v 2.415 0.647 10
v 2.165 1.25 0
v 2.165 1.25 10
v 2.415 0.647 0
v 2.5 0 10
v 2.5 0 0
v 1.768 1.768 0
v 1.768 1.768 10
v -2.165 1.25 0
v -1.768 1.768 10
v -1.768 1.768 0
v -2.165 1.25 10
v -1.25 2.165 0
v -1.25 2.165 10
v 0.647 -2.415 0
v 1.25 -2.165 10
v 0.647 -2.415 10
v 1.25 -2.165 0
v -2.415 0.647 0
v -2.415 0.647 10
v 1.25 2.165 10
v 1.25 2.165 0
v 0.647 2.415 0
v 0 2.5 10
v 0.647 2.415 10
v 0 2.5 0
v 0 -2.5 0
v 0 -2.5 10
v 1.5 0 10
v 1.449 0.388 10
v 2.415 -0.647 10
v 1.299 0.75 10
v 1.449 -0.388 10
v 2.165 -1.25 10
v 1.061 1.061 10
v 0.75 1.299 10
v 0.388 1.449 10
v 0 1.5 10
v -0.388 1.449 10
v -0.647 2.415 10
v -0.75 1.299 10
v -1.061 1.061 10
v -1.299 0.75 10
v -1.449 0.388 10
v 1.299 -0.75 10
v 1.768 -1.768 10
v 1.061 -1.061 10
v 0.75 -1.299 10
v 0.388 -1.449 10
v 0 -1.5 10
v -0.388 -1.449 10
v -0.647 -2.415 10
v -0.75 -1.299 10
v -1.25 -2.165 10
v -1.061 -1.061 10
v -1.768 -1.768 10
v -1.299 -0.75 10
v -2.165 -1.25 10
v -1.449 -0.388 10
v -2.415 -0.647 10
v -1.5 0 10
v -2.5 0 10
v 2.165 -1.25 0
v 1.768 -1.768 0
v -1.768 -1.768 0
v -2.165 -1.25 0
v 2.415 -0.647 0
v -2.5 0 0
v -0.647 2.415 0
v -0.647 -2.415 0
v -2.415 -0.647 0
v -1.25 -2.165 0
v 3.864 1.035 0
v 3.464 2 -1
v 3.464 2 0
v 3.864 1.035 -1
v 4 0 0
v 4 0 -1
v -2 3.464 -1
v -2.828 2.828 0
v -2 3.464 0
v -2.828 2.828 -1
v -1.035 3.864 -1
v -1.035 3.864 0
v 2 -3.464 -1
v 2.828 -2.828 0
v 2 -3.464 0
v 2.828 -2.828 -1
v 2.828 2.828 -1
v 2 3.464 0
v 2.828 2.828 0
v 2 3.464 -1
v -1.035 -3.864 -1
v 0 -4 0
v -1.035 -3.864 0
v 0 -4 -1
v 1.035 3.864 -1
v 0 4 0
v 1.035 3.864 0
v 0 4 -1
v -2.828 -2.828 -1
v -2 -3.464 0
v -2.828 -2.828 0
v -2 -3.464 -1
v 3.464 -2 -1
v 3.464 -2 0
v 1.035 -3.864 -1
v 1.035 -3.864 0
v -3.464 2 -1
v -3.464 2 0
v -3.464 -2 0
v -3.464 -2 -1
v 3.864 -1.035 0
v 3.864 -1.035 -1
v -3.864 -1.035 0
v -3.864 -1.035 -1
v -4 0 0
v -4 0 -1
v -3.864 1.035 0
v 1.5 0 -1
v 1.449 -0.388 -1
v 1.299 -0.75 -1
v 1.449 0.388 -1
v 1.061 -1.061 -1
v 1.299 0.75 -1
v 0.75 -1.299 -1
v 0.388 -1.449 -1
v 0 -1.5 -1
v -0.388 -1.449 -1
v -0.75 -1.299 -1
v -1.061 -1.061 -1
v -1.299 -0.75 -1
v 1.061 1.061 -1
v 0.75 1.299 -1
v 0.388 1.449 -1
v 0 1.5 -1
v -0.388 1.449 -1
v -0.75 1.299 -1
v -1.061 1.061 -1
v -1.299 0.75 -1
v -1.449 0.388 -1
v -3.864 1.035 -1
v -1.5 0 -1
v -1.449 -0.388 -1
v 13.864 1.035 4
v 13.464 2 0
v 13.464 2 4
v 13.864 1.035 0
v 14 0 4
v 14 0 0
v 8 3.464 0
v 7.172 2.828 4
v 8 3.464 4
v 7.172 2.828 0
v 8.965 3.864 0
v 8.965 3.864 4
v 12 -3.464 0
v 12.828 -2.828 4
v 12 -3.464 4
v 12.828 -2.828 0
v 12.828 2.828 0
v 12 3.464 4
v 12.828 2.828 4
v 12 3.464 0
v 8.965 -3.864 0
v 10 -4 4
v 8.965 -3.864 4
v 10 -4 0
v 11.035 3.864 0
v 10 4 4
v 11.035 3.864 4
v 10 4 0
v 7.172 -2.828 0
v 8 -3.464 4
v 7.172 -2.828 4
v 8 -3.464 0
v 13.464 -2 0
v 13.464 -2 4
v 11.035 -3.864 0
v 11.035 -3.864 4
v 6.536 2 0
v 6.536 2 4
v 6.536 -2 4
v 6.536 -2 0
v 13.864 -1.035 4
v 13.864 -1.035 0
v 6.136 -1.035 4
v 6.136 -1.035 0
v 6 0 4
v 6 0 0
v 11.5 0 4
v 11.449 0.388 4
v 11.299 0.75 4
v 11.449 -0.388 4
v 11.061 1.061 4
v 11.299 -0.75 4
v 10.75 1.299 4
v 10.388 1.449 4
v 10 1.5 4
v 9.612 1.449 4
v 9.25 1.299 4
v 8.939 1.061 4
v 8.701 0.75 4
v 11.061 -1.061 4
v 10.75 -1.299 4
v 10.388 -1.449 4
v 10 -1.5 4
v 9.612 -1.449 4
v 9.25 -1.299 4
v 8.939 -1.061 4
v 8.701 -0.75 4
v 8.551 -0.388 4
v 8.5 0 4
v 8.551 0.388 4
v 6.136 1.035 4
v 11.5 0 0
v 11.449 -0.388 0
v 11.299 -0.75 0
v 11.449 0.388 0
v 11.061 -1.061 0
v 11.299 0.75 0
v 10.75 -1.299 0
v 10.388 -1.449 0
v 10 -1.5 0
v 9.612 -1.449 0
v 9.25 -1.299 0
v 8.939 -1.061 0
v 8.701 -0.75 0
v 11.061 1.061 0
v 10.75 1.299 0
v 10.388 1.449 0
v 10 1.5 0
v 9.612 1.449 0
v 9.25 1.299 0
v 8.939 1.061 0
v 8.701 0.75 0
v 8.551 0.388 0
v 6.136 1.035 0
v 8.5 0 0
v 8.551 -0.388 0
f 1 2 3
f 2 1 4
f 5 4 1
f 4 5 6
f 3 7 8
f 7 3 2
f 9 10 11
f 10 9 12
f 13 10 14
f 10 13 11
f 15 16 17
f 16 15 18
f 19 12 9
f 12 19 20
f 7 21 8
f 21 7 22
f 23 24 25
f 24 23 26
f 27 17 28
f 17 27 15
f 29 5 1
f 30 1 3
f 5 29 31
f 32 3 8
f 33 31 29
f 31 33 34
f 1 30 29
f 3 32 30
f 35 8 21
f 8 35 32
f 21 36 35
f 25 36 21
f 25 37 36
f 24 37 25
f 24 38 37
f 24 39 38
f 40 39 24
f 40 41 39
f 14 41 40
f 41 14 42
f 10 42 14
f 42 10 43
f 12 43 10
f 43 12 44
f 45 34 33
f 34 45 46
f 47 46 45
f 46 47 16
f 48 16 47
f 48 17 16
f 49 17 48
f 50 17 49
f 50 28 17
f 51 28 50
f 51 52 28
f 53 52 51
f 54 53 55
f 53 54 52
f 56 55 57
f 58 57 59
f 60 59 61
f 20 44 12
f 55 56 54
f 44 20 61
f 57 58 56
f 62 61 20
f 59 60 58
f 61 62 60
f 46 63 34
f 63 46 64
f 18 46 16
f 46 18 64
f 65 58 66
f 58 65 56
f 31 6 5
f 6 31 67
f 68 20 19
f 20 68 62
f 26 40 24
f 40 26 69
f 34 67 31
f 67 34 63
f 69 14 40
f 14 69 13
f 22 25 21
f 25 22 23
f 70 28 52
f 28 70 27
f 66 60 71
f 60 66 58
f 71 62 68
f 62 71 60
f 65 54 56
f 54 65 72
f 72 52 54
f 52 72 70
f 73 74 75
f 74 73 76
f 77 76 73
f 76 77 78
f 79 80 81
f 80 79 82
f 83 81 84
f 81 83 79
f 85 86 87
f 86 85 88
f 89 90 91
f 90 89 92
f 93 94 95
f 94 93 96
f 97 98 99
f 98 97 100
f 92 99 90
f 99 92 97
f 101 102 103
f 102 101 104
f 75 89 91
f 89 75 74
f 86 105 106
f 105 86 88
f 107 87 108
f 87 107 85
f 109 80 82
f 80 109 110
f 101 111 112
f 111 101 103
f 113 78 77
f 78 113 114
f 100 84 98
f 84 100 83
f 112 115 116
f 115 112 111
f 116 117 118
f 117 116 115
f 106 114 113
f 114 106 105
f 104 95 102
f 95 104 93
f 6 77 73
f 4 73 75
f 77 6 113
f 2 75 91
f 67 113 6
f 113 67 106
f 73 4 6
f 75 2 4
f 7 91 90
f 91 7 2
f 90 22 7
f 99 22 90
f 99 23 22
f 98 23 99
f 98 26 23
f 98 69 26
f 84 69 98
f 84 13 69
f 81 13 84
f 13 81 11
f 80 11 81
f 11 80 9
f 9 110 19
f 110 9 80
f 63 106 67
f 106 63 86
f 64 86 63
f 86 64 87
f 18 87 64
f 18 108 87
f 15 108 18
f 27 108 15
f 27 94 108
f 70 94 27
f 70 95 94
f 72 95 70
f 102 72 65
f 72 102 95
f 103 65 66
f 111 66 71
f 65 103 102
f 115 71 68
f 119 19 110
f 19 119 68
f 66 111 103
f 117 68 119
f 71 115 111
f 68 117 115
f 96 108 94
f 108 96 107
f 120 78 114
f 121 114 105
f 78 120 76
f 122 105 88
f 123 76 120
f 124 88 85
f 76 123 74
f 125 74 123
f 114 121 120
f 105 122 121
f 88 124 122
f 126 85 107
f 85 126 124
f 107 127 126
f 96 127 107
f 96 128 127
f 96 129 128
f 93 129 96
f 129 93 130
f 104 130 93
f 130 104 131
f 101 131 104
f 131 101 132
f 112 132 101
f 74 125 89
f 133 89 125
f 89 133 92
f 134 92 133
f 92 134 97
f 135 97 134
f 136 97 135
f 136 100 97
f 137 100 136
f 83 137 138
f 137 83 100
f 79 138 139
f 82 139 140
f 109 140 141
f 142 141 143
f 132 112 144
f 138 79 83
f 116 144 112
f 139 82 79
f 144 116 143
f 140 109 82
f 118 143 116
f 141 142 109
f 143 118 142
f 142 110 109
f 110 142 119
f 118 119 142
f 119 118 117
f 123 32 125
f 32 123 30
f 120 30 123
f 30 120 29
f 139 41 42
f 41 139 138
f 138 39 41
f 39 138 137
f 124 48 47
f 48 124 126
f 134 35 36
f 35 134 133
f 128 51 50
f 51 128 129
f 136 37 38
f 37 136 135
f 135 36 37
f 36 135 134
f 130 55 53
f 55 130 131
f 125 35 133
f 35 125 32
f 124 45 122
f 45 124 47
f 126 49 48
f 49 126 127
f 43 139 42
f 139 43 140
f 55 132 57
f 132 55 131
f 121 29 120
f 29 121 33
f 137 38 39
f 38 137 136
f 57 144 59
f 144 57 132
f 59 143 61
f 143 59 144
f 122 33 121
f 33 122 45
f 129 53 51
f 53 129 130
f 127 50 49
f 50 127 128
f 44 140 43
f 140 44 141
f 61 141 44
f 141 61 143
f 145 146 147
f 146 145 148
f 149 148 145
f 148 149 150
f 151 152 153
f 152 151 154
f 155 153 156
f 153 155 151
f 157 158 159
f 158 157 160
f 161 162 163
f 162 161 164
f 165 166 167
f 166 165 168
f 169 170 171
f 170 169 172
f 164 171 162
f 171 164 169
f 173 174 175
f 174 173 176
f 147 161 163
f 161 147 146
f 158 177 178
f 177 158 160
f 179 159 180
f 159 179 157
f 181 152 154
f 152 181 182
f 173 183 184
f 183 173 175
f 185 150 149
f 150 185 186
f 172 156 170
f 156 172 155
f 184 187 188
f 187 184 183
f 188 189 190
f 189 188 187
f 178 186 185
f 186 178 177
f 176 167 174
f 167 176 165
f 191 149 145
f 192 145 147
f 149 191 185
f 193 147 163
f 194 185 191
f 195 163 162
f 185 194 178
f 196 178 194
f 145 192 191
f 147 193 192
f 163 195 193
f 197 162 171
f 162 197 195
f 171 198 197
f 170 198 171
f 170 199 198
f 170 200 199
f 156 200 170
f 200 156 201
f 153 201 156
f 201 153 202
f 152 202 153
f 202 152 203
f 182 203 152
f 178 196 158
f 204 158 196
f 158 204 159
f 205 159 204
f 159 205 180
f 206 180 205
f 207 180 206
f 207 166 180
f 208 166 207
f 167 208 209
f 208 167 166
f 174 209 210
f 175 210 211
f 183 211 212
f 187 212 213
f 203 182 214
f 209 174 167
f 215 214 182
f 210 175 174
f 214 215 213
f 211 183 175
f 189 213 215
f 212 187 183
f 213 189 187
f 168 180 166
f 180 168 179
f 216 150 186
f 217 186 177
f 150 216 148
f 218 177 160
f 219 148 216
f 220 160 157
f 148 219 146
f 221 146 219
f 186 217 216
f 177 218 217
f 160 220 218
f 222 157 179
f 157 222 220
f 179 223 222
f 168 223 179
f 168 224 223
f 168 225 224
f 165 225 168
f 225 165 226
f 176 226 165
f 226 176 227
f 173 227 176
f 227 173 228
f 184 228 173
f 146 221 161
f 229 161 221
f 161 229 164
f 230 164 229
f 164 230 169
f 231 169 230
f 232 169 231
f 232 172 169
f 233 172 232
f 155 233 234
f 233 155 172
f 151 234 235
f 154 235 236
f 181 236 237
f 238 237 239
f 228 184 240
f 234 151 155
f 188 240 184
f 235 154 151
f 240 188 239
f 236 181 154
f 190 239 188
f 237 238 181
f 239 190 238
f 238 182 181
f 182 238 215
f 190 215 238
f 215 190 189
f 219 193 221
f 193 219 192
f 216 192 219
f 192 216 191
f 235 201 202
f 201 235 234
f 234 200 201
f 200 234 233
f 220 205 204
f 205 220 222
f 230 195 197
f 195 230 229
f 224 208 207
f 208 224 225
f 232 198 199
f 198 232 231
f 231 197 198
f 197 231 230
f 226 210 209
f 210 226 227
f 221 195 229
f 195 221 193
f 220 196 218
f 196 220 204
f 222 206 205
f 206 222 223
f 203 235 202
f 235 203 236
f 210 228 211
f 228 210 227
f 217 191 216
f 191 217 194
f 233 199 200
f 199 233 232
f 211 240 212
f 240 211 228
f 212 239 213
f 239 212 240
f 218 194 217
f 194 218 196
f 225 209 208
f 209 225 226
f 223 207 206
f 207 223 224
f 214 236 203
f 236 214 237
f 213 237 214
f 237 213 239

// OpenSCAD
module Insert
(
	inner_diam=3,
	outer_diam=5,
	insert_height=10,
	base_height=1,
	base_diam=8,
	quality=2,
)
{
	cutClr=0.01;
	difference()
	{
		union()
		{
			translate([0,0,-cutClr])
			cylinder(d=outer_diam,h=insert_height+cutClr,$fn=quality*12);
			translate([0,0,-base_height])
			cylinder(d=base_diam,h=base_height,$fn=quality*12);
		}
		translate([0,0,-base_height-cutClr])
		cylinder(d=inner_diam,h=base_height+insert_height+2*cutClr,$fn=quality*12);
	}
}

module Spacer
(
	inner_diam=3,
	base_diam=8,
	spacer_height=4,
	quality=2,
)
{
	cutClr=0.01;
	difference()
	{
		cylinder(d=base_diam,h=spacer_height,$fn=quality*12);
		translate([0,0,-cutClr])
		cylinder(d=inner_diam,h=spacer_height+2*cutClr,$fn=quality*12);
	}
}

Insert();

translate([10,0])
Spacer();
